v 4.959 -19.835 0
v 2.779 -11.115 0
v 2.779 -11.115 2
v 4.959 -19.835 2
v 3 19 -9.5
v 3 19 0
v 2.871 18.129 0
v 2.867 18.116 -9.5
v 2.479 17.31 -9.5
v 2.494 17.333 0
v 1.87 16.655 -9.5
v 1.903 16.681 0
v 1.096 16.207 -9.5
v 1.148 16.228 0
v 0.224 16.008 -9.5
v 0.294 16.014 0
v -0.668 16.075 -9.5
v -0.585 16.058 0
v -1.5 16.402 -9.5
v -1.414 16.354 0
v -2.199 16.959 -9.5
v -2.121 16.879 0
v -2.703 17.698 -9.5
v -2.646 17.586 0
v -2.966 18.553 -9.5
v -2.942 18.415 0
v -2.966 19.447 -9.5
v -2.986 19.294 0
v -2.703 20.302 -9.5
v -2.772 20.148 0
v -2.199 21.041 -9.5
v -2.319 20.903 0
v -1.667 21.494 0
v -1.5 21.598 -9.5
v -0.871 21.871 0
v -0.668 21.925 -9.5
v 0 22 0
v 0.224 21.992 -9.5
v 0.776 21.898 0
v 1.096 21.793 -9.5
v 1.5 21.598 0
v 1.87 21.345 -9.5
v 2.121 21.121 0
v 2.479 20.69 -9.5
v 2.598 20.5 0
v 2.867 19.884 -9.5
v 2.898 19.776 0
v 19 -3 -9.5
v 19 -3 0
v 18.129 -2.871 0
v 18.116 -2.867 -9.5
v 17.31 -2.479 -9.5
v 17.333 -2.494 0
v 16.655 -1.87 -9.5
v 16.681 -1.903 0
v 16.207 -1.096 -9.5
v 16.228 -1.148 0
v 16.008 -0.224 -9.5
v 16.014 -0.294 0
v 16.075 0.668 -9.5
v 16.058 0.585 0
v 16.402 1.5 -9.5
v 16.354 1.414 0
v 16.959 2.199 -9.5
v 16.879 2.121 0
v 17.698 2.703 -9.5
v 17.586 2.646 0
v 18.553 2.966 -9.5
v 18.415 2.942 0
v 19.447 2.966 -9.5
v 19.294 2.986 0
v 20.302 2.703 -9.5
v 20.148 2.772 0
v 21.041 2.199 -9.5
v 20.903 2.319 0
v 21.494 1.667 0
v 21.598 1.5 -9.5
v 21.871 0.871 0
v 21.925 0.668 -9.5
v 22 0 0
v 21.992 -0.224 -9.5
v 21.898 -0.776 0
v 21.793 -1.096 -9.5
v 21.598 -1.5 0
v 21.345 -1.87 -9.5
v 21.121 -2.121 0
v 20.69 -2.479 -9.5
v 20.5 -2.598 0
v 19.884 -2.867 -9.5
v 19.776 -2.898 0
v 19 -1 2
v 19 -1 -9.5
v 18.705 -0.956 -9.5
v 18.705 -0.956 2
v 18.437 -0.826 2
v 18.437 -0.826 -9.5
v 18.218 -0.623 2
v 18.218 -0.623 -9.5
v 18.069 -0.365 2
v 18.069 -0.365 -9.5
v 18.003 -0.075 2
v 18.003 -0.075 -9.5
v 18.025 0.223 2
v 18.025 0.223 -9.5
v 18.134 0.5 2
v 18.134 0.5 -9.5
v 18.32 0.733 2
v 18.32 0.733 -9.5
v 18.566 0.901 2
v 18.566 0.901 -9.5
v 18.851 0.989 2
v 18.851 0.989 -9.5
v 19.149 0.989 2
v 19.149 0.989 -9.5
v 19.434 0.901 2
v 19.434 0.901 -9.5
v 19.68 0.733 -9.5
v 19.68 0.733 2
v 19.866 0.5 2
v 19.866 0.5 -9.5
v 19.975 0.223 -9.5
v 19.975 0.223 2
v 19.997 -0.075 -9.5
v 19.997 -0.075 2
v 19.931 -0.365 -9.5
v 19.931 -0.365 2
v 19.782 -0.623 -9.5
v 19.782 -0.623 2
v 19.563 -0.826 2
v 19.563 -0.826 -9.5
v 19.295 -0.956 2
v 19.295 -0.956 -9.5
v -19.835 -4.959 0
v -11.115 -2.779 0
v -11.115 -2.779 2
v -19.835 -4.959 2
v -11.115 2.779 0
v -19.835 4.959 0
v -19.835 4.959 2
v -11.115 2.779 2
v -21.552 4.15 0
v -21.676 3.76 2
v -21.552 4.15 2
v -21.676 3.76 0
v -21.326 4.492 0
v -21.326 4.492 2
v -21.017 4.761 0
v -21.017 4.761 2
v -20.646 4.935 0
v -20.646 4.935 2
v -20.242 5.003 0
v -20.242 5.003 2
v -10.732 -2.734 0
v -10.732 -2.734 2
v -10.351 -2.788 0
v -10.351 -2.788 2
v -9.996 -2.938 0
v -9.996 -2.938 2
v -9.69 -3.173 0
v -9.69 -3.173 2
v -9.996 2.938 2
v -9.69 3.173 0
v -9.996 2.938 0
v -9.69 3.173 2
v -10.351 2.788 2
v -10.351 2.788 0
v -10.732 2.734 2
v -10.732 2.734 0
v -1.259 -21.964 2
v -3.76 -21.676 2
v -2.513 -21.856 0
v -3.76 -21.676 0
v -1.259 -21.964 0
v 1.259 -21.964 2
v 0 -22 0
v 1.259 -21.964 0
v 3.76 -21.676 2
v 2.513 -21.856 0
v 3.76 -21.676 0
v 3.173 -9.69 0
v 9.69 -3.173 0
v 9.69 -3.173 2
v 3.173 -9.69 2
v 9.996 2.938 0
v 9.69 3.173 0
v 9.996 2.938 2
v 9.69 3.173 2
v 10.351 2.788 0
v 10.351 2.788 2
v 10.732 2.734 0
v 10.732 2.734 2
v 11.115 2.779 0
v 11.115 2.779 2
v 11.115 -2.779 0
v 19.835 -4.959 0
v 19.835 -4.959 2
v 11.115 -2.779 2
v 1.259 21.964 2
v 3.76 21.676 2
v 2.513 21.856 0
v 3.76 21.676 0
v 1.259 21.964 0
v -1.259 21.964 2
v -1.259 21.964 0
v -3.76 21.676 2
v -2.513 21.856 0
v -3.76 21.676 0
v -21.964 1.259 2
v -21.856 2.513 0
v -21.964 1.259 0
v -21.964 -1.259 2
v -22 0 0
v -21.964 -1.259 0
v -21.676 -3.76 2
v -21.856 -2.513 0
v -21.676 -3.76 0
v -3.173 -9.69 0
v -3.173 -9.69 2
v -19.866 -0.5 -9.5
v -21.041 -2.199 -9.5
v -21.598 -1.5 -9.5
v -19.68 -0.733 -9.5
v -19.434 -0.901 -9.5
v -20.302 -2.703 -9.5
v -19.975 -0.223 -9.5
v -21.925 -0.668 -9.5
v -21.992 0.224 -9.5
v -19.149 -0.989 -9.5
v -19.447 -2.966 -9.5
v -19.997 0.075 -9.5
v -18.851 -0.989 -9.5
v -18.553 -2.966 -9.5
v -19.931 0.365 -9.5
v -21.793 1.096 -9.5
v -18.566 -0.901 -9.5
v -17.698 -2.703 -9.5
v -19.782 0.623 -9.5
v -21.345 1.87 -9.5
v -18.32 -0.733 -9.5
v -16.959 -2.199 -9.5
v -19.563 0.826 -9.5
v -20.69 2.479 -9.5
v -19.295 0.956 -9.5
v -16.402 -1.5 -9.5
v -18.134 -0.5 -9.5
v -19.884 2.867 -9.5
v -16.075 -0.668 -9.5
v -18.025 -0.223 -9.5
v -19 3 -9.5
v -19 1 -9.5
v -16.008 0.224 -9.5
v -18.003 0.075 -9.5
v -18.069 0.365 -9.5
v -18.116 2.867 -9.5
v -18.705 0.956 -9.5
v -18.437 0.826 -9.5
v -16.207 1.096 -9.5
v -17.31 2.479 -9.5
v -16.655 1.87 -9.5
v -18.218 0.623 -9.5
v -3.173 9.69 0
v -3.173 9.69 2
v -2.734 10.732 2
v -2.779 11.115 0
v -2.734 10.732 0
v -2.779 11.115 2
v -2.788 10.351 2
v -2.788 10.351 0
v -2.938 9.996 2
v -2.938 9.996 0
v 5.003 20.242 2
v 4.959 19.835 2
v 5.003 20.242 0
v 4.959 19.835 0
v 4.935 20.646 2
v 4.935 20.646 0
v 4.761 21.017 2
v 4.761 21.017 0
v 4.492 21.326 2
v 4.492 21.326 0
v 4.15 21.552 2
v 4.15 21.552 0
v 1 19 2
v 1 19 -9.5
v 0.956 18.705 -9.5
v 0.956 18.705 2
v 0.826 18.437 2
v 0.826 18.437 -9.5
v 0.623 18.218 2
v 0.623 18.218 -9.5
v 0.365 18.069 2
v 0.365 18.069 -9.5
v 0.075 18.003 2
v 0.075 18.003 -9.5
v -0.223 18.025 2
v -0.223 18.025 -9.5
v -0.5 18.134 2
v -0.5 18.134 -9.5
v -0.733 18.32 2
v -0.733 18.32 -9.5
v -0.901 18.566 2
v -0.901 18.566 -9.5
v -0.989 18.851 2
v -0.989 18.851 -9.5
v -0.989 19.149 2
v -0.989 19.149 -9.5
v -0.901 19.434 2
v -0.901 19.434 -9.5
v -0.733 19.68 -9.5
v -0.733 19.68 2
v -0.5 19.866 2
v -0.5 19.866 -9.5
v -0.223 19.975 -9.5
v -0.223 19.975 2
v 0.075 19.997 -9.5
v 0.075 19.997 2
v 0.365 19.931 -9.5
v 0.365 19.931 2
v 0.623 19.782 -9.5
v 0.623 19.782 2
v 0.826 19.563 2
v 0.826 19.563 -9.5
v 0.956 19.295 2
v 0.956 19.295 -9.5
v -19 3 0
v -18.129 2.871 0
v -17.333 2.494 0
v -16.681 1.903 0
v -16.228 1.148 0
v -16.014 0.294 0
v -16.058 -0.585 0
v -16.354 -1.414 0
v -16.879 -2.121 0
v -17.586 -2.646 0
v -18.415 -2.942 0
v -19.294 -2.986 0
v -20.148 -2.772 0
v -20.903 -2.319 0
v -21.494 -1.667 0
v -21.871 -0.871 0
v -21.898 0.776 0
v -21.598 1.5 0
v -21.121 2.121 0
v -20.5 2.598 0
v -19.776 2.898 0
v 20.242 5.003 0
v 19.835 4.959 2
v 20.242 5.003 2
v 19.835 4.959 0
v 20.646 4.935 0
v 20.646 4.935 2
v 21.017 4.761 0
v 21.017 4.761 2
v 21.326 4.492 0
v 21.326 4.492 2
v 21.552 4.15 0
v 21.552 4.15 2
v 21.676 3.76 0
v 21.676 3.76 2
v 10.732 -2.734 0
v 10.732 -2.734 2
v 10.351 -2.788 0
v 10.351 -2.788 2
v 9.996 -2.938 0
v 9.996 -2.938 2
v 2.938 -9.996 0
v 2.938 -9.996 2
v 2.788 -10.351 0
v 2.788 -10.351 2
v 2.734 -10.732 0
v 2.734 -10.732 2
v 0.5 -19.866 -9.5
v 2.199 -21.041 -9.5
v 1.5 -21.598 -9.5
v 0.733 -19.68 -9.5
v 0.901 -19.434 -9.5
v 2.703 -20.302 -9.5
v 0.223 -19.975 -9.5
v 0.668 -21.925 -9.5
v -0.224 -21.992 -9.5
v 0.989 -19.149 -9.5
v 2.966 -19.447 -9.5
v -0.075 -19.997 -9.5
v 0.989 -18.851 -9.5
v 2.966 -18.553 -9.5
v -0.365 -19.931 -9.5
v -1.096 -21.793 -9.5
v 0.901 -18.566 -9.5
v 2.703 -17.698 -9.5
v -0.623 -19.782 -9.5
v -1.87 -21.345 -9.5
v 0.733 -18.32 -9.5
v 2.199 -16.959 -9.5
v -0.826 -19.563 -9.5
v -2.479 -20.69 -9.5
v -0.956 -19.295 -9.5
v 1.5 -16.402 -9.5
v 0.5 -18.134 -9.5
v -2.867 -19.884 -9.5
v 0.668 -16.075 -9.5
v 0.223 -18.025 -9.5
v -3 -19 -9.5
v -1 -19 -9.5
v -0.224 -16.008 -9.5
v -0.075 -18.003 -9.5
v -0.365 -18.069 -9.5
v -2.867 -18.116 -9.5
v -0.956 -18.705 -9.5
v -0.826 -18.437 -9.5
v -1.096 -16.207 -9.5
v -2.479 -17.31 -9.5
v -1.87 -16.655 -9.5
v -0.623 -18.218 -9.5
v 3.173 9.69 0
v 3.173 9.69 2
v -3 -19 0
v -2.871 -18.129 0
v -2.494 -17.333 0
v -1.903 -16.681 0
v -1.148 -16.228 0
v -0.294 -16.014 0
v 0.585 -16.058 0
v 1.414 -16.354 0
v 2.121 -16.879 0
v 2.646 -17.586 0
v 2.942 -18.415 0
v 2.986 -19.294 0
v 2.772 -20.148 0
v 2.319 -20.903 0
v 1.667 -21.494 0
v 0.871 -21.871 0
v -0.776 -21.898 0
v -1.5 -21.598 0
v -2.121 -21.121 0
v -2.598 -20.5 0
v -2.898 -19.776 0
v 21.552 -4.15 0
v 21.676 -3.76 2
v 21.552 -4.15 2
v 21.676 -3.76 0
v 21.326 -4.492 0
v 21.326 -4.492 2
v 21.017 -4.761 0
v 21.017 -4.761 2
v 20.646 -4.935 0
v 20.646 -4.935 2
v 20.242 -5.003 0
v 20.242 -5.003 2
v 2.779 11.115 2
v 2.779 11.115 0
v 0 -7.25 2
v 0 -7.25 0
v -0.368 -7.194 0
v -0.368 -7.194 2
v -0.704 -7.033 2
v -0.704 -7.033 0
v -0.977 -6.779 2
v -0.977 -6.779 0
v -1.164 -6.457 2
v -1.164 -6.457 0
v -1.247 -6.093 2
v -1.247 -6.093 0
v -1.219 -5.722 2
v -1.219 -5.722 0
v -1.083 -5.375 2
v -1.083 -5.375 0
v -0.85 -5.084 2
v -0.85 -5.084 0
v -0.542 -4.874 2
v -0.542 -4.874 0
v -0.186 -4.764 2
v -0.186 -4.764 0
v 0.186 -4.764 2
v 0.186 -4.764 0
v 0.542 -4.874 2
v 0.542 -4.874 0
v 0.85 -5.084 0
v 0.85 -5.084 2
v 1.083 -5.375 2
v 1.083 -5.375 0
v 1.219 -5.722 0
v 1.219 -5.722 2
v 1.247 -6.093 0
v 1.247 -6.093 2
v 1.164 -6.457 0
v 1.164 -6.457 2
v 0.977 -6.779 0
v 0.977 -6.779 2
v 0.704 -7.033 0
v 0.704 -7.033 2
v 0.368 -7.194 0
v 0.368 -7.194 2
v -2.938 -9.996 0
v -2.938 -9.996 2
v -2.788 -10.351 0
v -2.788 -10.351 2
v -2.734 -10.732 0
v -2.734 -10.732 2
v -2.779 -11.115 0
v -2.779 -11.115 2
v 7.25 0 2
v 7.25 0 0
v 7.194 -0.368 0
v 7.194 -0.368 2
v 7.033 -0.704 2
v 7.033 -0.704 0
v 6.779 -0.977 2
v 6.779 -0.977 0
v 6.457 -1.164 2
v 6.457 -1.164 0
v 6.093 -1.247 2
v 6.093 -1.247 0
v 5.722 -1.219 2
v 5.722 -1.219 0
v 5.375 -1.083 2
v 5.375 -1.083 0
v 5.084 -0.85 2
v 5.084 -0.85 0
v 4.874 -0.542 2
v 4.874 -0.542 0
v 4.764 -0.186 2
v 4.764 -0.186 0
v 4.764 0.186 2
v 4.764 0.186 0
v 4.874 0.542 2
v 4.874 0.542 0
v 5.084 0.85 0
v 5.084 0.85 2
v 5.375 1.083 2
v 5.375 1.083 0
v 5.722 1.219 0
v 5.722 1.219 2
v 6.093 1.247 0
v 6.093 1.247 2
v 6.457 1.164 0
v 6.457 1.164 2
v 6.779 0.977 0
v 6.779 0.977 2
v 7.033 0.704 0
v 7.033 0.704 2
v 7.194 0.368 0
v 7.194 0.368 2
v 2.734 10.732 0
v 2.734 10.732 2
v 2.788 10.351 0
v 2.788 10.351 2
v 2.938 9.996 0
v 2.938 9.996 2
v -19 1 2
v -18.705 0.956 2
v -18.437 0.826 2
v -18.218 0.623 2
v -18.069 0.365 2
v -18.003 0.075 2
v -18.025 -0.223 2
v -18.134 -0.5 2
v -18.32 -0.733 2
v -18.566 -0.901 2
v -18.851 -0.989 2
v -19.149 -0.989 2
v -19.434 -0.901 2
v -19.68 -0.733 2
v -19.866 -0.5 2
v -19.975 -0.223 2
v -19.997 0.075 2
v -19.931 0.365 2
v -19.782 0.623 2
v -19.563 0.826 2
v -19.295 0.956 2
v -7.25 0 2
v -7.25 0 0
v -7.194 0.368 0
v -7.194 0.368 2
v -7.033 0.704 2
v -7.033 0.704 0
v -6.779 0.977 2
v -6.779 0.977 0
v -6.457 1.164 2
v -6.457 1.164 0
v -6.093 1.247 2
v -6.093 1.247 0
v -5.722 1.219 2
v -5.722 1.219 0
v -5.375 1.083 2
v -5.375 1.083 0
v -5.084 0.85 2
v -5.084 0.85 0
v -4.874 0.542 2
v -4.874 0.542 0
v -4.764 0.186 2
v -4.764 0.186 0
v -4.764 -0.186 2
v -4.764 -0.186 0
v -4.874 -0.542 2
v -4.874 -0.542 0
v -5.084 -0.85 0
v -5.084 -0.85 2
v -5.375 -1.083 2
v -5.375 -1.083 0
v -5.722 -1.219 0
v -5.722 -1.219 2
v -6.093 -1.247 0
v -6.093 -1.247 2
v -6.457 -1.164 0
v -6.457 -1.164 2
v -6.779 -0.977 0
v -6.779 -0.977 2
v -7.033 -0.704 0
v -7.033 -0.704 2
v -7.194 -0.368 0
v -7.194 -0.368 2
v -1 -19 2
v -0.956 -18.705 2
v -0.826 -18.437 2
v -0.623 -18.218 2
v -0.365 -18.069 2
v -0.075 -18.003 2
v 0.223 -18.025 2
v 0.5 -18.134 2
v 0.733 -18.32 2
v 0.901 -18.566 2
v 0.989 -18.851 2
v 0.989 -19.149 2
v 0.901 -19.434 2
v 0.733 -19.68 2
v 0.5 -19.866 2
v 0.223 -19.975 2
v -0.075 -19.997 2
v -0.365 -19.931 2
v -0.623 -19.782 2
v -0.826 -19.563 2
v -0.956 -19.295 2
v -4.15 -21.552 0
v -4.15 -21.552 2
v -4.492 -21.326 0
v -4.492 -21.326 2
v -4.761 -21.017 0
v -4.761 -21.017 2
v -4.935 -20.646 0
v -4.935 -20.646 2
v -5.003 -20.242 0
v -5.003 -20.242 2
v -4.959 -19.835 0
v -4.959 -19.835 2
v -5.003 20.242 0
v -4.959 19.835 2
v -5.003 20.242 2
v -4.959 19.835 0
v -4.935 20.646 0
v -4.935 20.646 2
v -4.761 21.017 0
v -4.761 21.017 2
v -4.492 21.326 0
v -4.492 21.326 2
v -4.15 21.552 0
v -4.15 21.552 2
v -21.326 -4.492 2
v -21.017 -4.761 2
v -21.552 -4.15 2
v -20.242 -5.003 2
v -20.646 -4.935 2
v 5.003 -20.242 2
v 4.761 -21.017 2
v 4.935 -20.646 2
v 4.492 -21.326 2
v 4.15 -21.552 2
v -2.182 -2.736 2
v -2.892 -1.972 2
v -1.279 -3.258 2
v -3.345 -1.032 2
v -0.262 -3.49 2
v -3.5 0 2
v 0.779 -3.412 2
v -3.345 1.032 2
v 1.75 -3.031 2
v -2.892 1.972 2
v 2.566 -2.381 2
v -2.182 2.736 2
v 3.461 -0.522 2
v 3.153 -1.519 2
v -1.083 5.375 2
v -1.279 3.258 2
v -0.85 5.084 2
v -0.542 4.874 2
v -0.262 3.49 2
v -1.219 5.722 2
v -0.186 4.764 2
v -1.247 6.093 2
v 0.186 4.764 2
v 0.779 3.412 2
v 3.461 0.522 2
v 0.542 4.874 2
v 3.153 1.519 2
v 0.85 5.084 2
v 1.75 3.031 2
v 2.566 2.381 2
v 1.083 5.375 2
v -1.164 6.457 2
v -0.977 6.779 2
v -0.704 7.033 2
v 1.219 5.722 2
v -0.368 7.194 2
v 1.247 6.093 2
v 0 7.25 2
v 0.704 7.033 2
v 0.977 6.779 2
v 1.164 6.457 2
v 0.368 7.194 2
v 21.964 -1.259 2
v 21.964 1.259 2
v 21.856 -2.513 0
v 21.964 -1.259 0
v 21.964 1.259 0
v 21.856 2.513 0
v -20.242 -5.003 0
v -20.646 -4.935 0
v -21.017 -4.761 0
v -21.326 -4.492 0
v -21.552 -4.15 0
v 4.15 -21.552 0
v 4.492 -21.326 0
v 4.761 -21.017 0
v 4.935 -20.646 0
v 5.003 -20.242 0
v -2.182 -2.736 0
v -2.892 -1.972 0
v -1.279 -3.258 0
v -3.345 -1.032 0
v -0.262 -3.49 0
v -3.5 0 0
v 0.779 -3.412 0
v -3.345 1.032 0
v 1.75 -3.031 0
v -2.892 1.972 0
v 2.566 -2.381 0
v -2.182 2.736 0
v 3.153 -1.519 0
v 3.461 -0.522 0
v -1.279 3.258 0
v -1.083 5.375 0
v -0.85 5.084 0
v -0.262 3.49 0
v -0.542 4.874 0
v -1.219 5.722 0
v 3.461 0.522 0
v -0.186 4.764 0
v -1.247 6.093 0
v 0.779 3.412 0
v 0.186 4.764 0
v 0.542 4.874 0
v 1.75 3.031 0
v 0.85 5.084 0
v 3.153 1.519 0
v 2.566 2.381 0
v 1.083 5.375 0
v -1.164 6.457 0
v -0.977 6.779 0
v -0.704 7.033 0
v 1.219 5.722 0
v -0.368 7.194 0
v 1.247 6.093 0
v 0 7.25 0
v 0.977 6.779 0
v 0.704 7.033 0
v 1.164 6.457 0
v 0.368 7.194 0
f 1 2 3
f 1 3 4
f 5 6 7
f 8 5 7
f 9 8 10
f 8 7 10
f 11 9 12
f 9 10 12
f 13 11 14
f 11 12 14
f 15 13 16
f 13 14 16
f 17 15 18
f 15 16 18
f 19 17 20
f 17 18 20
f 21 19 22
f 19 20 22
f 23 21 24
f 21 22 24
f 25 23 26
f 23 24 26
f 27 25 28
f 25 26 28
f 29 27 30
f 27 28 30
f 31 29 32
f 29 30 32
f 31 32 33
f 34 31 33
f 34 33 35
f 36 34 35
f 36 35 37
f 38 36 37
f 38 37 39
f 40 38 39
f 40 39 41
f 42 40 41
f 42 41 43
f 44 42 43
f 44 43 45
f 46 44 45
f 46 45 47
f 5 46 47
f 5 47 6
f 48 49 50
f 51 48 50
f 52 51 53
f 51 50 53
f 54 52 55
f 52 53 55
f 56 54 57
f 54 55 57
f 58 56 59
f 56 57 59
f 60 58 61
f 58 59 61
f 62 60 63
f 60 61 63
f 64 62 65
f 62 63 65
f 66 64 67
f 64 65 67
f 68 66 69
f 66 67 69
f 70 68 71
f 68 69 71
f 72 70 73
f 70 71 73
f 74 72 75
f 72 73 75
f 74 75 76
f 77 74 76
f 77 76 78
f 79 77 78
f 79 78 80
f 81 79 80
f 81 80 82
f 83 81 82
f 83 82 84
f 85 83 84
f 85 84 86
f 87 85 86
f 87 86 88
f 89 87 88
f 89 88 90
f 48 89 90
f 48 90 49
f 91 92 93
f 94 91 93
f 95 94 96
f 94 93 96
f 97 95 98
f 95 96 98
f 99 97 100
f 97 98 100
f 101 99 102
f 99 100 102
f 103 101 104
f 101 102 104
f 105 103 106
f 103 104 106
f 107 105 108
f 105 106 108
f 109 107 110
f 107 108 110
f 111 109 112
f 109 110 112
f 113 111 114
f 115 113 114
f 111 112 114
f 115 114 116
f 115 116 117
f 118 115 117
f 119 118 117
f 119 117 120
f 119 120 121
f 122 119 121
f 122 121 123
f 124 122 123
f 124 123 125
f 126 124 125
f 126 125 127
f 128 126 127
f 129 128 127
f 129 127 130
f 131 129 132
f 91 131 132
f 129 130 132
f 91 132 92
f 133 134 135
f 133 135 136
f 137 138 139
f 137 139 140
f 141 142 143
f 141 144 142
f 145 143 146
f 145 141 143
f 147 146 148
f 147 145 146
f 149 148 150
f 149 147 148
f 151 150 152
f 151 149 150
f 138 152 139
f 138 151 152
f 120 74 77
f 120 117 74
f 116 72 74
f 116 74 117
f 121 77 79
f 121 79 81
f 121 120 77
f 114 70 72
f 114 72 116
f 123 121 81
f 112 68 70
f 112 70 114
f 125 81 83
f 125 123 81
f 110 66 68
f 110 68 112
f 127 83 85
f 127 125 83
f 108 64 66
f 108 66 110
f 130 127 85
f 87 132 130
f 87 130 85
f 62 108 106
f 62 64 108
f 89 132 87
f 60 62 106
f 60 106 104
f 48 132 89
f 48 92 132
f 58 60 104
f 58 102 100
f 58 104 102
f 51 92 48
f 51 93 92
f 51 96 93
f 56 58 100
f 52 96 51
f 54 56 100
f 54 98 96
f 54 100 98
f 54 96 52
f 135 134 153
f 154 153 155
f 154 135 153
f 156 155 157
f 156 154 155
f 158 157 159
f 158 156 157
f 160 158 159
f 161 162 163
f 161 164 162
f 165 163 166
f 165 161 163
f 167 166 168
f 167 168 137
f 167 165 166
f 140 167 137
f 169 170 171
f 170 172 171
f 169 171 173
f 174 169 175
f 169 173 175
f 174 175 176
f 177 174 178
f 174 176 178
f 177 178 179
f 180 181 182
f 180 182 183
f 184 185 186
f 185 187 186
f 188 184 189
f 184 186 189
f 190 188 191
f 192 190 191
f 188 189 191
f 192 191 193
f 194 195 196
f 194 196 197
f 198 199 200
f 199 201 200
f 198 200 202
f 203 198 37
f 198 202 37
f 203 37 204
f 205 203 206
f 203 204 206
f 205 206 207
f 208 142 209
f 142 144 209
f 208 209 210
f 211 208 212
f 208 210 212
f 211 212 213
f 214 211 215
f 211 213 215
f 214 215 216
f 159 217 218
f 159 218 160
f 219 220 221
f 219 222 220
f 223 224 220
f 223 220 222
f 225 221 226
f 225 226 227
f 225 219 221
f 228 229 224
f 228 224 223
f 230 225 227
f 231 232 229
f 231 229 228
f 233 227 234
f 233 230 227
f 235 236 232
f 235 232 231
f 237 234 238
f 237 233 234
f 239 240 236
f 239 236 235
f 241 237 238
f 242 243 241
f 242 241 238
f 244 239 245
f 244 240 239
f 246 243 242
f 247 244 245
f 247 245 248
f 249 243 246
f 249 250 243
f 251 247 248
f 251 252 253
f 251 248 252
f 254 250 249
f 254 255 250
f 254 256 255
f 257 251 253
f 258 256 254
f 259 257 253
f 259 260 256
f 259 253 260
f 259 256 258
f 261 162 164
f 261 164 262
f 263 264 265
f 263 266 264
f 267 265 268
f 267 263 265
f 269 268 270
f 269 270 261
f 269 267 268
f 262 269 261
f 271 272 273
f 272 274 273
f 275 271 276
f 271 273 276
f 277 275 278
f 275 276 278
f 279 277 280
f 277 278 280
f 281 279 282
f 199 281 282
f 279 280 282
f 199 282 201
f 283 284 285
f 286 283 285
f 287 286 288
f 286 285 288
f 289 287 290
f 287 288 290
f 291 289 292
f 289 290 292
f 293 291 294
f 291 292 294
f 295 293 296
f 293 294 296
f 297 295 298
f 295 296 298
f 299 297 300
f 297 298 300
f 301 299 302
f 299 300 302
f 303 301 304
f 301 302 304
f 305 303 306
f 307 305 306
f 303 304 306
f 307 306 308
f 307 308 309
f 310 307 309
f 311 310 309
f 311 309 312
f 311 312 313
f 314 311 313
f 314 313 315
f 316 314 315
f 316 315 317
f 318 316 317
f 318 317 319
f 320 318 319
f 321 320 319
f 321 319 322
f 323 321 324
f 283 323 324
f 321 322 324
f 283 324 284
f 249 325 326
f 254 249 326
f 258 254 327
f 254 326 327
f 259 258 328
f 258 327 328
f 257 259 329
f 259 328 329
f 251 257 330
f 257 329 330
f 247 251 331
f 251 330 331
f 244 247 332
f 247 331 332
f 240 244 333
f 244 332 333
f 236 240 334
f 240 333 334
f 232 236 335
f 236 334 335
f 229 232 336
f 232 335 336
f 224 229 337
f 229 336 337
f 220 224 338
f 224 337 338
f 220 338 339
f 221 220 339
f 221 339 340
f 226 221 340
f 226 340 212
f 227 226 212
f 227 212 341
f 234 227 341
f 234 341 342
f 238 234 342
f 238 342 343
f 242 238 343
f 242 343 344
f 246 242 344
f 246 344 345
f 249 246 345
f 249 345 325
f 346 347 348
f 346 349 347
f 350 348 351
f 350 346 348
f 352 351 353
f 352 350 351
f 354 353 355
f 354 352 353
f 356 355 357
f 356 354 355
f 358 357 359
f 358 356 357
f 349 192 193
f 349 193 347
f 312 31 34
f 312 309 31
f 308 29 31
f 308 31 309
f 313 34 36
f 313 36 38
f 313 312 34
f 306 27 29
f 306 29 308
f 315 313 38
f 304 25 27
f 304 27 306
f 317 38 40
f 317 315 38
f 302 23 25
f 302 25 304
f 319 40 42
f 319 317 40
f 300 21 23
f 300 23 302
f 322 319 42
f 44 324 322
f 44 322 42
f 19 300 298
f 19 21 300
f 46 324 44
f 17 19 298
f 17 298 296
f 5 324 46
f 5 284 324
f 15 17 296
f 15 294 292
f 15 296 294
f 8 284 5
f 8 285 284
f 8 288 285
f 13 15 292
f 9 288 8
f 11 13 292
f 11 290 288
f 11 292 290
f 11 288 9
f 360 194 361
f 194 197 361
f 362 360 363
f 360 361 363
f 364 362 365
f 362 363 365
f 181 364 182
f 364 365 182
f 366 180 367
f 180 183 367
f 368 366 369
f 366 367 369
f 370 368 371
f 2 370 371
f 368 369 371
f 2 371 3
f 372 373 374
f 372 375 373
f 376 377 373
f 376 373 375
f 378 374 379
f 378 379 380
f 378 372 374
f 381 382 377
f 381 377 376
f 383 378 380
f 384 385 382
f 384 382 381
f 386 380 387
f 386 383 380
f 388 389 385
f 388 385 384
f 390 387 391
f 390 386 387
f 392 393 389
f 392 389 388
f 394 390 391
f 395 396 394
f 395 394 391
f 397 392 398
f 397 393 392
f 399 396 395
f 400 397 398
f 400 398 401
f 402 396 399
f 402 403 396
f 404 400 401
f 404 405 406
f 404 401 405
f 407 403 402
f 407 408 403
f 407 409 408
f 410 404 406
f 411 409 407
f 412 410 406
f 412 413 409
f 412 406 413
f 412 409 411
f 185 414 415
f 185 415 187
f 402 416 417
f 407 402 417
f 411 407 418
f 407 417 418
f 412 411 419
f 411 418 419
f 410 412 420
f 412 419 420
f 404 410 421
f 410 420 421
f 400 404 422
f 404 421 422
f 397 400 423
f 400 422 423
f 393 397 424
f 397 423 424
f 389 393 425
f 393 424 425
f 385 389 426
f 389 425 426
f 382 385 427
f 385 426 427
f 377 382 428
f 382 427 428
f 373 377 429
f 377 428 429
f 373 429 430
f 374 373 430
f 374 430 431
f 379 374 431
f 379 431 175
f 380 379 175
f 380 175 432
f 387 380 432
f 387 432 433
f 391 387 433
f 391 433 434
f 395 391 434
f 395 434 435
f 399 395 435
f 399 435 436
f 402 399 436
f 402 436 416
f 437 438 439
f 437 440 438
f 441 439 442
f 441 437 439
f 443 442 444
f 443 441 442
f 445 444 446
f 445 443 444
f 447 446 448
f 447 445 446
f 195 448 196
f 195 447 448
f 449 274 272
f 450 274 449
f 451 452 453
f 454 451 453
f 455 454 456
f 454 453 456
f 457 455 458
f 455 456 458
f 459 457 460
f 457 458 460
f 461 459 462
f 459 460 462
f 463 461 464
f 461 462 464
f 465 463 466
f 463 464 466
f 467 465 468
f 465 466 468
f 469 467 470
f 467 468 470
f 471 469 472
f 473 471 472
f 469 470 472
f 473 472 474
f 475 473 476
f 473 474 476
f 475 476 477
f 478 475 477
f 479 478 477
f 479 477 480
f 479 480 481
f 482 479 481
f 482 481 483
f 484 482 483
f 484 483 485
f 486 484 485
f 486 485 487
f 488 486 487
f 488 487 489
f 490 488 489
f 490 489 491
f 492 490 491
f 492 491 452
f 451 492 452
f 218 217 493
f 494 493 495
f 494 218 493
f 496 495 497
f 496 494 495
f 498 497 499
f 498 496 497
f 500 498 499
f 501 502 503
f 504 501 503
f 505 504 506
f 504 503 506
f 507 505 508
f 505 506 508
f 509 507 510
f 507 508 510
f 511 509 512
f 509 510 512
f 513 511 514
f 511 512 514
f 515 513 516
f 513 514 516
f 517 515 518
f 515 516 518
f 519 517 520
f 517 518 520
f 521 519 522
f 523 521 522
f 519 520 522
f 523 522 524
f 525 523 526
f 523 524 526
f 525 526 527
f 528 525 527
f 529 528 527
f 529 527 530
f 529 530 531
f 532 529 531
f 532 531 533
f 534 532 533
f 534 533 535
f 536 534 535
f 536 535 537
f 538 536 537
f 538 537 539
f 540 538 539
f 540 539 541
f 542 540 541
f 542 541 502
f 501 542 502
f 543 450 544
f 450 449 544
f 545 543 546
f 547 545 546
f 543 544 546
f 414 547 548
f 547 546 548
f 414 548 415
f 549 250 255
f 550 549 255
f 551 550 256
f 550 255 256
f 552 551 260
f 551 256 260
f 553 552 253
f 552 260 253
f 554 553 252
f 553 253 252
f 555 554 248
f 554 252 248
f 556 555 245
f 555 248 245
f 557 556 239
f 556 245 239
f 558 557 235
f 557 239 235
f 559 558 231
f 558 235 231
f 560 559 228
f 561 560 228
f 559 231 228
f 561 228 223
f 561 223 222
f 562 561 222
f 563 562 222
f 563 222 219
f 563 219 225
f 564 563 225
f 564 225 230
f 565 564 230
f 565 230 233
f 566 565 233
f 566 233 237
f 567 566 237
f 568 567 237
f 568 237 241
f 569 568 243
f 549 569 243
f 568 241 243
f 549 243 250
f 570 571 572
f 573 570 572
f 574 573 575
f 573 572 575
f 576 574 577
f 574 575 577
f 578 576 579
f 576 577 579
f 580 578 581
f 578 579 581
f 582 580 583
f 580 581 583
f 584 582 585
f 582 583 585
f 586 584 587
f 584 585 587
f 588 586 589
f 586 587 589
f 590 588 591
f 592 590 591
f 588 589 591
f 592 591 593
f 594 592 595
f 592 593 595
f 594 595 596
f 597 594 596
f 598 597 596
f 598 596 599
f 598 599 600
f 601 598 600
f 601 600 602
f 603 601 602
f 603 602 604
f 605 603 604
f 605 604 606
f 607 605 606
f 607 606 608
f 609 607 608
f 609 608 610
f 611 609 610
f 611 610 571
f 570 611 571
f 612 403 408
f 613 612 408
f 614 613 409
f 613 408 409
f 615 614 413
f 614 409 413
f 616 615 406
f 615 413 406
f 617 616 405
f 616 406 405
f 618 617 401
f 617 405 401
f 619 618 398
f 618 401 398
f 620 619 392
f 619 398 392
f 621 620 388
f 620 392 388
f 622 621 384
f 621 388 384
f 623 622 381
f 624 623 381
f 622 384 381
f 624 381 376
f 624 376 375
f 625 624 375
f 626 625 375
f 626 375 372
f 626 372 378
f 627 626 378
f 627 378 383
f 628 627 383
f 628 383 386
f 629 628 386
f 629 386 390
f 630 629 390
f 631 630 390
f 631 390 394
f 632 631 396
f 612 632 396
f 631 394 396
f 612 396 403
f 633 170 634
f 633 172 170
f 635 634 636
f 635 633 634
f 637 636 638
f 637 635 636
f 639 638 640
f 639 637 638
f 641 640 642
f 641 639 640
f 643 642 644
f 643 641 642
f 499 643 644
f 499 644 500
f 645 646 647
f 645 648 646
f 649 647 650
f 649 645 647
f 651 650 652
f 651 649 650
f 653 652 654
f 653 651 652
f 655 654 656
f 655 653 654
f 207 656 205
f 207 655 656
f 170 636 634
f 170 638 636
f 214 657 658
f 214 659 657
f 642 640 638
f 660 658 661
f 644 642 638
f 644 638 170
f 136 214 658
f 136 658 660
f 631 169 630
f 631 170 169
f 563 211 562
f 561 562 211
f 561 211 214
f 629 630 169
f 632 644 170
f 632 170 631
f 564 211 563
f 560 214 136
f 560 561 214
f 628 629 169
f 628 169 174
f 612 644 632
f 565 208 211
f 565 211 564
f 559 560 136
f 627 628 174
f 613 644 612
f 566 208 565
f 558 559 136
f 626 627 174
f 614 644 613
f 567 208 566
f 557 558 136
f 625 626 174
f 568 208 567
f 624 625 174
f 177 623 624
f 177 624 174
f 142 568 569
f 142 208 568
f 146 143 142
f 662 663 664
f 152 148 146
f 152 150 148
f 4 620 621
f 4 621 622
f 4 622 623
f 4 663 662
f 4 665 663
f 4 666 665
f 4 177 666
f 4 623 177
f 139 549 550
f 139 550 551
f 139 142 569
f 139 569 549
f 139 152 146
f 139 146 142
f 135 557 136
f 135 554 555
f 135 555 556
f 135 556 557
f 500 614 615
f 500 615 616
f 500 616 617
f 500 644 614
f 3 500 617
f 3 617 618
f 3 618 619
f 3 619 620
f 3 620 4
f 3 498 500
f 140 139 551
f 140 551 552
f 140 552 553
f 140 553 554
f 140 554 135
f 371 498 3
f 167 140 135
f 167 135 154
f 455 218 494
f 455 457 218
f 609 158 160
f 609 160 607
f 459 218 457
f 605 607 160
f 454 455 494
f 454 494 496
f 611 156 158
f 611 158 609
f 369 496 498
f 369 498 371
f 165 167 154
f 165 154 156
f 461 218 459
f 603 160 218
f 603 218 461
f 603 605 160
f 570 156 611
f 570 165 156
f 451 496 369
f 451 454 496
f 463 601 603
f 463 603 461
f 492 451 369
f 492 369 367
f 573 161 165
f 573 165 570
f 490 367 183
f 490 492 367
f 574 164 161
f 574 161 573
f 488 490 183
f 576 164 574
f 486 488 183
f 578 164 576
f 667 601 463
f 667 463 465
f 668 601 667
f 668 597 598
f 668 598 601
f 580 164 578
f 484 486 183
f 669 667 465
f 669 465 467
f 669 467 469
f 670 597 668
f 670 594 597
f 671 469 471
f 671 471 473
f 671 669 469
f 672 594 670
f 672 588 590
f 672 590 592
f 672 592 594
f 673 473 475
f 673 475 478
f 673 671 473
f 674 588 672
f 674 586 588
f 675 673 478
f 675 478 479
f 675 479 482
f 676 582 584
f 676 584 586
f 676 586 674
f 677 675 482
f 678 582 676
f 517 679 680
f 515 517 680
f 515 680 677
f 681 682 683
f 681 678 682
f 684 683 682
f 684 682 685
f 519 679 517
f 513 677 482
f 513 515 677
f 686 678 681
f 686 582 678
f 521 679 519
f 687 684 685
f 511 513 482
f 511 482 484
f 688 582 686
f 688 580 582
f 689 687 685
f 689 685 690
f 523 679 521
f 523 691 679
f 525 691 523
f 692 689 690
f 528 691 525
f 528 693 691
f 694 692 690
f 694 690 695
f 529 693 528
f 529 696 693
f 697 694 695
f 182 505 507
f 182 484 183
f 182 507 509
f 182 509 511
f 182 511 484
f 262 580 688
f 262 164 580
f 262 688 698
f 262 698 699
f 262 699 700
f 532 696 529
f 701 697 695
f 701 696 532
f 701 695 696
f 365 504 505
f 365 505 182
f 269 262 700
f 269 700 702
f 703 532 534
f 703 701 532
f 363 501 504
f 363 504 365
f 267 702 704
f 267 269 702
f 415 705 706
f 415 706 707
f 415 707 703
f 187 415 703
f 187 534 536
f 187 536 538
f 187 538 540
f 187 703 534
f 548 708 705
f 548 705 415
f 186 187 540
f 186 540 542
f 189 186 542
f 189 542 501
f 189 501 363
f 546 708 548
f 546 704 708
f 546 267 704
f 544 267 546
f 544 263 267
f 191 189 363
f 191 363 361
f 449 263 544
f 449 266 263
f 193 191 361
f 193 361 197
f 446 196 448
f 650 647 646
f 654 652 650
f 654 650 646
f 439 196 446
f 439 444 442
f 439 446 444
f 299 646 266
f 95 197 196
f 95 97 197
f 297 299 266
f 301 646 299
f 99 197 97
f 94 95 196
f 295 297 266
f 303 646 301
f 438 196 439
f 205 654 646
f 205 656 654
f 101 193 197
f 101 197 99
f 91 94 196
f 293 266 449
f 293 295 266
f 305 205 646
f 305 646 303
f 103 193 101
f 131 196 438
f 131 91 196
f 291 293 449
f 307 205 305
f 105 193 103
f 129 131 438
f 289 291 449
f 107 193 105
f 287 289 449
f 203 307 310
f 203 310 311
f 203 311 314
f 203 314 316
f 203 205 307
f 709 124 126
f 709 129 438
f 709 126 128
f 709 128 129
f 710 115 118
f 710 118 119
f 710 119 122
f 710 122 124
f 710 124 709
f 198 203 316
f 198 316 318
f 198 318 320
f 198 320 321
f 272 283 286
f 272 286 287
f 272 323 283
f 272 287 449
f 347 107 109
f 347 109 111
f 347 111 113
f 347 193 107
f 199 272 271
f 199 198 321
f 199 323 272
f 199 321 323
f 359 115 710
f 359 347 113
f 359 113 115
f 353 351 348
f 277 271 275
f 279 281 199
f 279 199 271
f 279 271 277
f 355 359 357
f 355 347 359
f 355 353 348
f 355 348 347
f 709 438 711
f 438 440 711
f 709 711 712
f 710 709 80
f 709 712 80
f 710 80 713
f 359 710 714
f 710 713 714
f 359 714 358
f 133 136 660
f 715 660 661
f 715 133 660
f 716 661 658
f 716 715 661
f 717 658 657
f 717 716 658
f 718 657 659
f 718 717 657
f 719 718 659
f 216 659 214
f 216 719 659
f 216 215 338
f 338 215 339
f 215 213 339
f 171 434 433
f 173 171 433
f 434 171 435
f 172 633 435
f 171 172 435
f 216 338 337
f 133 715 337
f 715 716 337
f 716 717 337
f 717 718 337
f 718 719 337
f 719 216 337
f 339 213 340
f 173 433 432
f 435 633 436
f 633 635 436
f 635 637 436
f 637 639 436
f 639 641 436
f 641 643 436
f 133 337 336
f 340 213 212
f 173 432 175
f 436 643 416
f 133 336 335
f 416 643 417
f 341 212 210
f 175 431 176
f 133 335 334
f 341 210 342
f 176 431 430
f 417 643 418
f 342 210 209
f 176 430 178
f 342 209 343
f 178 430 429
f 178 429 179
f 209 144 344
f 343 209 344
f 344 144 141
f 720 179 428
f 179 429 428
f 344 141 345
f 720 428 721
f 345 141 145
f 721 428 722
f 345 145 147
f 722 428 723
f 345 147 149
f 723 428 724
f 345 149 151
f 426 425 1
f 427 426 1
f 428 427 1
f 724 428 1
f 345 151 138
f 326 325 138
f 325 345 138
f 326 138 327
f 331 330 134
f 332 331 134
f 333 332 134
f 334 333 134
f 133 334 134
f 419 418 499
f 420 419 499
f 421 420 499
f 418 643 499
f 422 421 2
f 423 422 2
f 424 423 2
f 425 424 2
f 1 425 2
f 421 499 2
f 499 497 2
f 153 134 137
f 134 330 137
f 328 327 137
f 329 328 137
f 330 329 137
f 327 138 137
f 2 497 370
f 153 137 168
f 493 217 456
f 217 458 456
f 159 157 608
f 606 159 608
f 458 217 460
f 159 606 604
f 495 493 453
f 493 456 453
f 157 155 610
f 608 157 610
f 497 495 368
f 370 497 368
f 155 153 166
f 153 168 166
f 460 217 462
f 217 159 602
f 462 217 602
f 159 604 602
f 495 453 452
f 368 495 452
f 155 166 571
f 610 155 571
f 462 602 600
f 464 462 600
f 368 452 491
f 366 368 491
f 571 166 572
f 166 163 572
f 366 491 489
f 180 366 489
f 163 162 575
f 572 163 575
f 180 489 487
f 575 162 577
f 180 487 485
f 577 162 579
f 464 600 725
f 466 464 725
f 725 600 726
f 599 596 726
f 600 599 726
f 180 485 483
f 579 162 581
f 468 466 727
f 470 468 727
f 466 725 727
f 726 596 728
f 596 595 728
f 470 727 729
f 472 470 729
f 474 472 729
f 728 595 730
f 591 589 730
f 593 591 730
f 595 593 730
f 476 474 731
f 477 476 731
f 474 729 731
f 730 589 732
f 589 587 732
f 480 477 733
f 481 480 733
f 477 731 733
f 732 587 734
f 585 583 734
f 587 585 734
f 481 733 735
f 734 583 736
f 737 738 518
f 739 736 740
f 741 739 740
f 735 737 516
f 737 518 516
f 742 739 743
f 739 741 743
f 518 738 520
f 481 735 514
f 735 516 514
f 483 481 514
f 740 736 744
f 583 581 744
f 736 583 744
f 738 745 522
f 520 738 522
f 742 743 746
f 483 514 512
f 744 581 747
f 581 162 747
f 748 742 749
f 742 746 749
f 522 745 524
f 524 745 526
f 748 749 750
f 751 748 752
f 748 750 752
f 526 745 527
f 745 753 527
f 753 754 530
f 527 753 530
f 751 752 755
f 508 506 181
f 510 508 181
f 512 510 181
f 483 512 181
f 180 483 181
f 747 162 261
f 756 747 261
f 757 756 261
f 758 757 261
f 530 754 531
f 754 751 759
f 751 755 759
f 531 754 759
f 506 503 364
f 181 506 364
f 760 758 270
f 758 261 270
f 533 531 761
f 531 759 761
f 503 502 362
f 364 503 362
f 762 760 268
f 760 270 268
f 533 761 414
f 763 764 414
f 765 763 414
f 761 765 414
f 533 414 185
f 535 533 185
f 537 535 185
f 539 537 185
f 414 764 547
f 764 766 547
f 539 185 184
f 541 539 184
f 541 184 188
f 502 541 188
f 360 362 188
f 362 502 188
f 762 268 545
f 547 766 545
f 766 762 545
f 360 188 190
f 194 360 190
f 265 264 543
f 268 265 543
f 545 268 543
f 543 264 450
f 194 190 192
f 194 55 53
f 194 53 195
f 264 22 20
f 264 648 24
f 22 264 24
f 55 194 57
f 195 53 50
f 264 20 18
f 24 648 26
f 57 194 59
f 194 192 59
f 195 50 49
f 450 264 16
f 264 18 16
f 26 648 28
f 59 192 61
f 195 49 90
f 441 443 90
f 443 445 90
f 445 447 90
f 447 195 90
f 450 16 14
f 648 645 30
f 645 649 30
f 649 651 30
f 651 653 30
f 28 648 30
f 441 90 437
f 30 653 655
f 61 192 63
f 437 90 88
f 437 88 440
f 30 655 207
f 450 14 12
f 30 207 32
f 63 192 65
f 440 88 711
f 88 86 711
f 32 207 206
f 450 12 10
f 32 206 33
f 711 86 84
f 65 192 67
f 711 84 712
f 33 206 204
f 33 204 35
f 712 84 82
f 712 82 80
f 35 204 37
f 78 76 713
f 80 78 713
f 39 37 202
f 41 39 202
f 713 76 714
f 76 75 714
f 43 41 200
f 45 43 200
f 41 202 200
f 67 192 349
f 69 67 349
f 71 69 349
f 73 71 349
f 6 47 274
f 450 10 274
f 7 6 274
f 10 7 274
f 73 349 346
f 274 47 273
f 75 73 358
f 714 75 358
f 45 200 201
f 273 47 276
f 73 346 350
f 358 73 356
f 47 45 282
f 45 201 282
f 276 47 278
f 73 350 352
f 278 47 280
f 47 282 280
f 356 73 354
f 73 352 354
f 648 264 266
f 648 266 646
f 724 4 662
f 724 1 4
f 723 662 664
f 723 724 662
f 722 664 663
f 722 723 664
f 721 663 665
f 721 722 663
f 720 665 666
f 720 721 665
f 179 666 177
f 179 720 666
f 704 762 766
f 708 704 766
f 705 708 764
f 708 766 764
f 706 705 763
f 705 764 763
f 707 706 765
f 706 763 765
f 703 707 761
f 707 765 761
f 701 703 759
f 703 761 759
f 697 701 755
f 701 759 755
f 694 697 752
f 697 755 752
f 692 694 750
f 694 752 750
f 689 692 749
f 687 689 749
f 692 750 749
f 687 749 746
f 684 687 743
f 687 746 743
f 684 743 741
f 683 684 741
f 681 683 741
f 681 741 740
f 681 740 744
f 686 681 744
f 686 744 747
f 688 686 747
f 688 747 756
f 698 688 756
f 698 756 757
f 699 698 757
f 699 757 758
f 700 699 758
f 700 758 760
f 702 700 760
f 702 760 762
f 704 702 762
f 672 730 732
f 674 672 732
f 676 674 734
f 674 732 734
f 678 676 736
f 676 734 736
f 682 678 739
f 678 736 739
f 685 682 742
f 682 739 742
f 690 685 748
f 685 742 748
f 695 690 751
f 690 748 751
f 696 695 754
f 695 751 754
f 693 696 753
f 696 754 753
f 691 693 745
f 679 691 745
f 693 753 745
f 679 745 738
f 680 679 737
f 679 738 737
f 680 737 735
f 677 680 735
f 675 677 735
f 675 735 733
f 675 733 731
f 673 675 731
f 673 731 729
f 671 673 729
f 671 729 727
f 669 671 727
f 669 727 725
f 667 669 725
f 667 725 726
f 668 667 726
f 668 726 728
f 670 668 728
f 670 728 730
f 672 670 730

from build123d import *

# Parameters (mm, degrees)
SKETCH_1_R               = 22
EXTRUDE_1_DEPTH          = 2
SKETCH_3_R               = 1.25
CUT_EXTRUDE_1_DEPTH      = 3
SKETCH_4_R               = 3.5
CUT_EXTRUDE_2_DEPTH      = 3
SKETCH_6_R               = 3
EXTRUDE_3_DEPTH          = 9.5
SKETCH_8_R               = 1
CUT_EXTRUDE_4_DEPTH      = 11.5
CUT_EXTRUDE_3_DEPTH      = 6
PATTERN_CIRCULAR_1_COUNT = 4
FILLET_2_R               = 1.5
FILLET_3_R               = 1.5


with BuildPart() as part:
    # 草图1 → 凸台-拉伸1 (new body)
    with BuildSketch(Plane.XY):
        Circle(SKETCH_1_R)
    extrude(amount=EXTRUDE_1_DEPTH)

    # 草图3 → 切除-拉伸1 (cut)
    with BuildSketch(Plane(origin=(0, 0, 0), x_dir=(-1, 0, 0), z_dir=(0, 0, -1))):
        with Locations((6, 0)):
            Circle(SKETCH_3_R)
    cut_extrude_1 = extrude(amount=-CUT_EXTRUDE_1_DEPTH, mode=Mode.SUBTRACT)

    # 草图4 → 切除-拉伸2 (cut)
    with BuildSketch(Plane(origin=(0, 0, 0), x_dir=(-1, 0, 0), z_dir=(0, 0, -1))):
        Circle(SKETCH_4_R)
    extrude(amount=-CUT_EXTRUDE_2_DEPTH, mode=Mode.SUBTRACT)

    # 草图6 → 凸台-拉伸3 (add)
    with BuildSketch(Plane(origin=(0, 0, 0), x_dir=(-1, 0, 0), z_dir=(0, 0, -1))):
        with Locations((0, -19)):
            Circle(SKETCH_6_R)
    extrude_3 = extrude(amount=EXTRUDE_3_DEPTH)

    # 草图8 → 切除-拉伸4 (cut)
    with BuildSketch(Plane(origin=(0, 0, -9.5), x_dir=(-1, 0, 0), z_dir=(0, 0, -1))):
        with Locations((0, -19)):
            Circle(SKETCH_8_R)
    cut_extrude_4 = extrude(amount=-CUT_EXTRUDE_4_DEPTH, mode=Mode.SUBTRACT)

    # 草图7 → 切除-拉伸3 (cut)
    with BuildSketch(Plane(origin=(0, 0, 0), x_dir=(-1, 0, 0), z_dir=(0, 0, -1))):
        Polygon((-2.572740594, 10.290962376), (-10.290962376, 2.572740594), (-30.512752563, 7.628188141), (-7.628188141, 30.512752563), align=None)
    cut_extrude_3 = extrude(amount=-CUT_EXTRUDE_3_DEPTH, mode=Mode.SUBTRACT)

    # 阵列(圆周)1: 切除-拉伸1, 凸台-拉伸3, 切除-拉伸4, 切除-拉伸3 ×4 about axis
    pattern_circular_1_axis = Axis((0, 0, 0), (0, 0, 1))
    for i in range(1, PATTERN_CIRCULAR_1_COUNT):
        add(cut_extrude_1.rotate(pattern_circular_1_axis, i * 360 / PATTERN_CIRCULAR_1_COUNT), mode=Mode.SUBTRACT)
        add(extrude_3.rotate(pattern_circular_1_axis, i * 360 / PATTERN_CIRCULAR_1_COUNT))
        add(cut_extrude_4.rotate(pattern_circular_1_axis, i * 360 / PATTERN_CIRCULAR_1_COUNT), mode=Mode.SUBTRACT)
        add(cut_extrude_3.rotate(pattern_circular_1_axis, i * 360 / PATTERN_CIRCULAR_1_COUNT), mode=Mode.SUBTRACT)

    # 圆角2
    fillet_2_edges = [part.edges().sort_by_distance(p)[0] for p in [
        (-5.335783751, -21.343135003, 1),
        (-21.343135003, -5.335783751, 1),
        (21.343135003, -5.335783751, 1),
        (5.335783751, -21.343135003, 1),
        (5.335783751, 21.343135003, 1),
        (21.343135003, 5.335783751, 1),
        (-21.343135003, 5.335783751, 1),
        (-5.335783751, 21.343135003, 1),
    ]]
    fillet(fillet_2_edges, radius=FILLET_2_R)

    # 圆角3
    fillet_3_edges = [part.edges().sort_by_distance(p)[0] for p in [
        (-10.290962376, -2.572740594, 1),
        (-2.572740594, -10.290962376, 1),
        (2.572740594, -10.290962376, 1),
        (10.290962376, -2.572740594, 1),
        (10.290962376, 2.572740594, 1),
        (2.572740594, 10.290962376, 1),
        (-2.572740594, 10.290962376, 1),
        (-10.290962376, 2.572740594, 1),
    ]]
    fillet(fillet_3_edges, radius=FILLET_3_R)


solid = part.part
